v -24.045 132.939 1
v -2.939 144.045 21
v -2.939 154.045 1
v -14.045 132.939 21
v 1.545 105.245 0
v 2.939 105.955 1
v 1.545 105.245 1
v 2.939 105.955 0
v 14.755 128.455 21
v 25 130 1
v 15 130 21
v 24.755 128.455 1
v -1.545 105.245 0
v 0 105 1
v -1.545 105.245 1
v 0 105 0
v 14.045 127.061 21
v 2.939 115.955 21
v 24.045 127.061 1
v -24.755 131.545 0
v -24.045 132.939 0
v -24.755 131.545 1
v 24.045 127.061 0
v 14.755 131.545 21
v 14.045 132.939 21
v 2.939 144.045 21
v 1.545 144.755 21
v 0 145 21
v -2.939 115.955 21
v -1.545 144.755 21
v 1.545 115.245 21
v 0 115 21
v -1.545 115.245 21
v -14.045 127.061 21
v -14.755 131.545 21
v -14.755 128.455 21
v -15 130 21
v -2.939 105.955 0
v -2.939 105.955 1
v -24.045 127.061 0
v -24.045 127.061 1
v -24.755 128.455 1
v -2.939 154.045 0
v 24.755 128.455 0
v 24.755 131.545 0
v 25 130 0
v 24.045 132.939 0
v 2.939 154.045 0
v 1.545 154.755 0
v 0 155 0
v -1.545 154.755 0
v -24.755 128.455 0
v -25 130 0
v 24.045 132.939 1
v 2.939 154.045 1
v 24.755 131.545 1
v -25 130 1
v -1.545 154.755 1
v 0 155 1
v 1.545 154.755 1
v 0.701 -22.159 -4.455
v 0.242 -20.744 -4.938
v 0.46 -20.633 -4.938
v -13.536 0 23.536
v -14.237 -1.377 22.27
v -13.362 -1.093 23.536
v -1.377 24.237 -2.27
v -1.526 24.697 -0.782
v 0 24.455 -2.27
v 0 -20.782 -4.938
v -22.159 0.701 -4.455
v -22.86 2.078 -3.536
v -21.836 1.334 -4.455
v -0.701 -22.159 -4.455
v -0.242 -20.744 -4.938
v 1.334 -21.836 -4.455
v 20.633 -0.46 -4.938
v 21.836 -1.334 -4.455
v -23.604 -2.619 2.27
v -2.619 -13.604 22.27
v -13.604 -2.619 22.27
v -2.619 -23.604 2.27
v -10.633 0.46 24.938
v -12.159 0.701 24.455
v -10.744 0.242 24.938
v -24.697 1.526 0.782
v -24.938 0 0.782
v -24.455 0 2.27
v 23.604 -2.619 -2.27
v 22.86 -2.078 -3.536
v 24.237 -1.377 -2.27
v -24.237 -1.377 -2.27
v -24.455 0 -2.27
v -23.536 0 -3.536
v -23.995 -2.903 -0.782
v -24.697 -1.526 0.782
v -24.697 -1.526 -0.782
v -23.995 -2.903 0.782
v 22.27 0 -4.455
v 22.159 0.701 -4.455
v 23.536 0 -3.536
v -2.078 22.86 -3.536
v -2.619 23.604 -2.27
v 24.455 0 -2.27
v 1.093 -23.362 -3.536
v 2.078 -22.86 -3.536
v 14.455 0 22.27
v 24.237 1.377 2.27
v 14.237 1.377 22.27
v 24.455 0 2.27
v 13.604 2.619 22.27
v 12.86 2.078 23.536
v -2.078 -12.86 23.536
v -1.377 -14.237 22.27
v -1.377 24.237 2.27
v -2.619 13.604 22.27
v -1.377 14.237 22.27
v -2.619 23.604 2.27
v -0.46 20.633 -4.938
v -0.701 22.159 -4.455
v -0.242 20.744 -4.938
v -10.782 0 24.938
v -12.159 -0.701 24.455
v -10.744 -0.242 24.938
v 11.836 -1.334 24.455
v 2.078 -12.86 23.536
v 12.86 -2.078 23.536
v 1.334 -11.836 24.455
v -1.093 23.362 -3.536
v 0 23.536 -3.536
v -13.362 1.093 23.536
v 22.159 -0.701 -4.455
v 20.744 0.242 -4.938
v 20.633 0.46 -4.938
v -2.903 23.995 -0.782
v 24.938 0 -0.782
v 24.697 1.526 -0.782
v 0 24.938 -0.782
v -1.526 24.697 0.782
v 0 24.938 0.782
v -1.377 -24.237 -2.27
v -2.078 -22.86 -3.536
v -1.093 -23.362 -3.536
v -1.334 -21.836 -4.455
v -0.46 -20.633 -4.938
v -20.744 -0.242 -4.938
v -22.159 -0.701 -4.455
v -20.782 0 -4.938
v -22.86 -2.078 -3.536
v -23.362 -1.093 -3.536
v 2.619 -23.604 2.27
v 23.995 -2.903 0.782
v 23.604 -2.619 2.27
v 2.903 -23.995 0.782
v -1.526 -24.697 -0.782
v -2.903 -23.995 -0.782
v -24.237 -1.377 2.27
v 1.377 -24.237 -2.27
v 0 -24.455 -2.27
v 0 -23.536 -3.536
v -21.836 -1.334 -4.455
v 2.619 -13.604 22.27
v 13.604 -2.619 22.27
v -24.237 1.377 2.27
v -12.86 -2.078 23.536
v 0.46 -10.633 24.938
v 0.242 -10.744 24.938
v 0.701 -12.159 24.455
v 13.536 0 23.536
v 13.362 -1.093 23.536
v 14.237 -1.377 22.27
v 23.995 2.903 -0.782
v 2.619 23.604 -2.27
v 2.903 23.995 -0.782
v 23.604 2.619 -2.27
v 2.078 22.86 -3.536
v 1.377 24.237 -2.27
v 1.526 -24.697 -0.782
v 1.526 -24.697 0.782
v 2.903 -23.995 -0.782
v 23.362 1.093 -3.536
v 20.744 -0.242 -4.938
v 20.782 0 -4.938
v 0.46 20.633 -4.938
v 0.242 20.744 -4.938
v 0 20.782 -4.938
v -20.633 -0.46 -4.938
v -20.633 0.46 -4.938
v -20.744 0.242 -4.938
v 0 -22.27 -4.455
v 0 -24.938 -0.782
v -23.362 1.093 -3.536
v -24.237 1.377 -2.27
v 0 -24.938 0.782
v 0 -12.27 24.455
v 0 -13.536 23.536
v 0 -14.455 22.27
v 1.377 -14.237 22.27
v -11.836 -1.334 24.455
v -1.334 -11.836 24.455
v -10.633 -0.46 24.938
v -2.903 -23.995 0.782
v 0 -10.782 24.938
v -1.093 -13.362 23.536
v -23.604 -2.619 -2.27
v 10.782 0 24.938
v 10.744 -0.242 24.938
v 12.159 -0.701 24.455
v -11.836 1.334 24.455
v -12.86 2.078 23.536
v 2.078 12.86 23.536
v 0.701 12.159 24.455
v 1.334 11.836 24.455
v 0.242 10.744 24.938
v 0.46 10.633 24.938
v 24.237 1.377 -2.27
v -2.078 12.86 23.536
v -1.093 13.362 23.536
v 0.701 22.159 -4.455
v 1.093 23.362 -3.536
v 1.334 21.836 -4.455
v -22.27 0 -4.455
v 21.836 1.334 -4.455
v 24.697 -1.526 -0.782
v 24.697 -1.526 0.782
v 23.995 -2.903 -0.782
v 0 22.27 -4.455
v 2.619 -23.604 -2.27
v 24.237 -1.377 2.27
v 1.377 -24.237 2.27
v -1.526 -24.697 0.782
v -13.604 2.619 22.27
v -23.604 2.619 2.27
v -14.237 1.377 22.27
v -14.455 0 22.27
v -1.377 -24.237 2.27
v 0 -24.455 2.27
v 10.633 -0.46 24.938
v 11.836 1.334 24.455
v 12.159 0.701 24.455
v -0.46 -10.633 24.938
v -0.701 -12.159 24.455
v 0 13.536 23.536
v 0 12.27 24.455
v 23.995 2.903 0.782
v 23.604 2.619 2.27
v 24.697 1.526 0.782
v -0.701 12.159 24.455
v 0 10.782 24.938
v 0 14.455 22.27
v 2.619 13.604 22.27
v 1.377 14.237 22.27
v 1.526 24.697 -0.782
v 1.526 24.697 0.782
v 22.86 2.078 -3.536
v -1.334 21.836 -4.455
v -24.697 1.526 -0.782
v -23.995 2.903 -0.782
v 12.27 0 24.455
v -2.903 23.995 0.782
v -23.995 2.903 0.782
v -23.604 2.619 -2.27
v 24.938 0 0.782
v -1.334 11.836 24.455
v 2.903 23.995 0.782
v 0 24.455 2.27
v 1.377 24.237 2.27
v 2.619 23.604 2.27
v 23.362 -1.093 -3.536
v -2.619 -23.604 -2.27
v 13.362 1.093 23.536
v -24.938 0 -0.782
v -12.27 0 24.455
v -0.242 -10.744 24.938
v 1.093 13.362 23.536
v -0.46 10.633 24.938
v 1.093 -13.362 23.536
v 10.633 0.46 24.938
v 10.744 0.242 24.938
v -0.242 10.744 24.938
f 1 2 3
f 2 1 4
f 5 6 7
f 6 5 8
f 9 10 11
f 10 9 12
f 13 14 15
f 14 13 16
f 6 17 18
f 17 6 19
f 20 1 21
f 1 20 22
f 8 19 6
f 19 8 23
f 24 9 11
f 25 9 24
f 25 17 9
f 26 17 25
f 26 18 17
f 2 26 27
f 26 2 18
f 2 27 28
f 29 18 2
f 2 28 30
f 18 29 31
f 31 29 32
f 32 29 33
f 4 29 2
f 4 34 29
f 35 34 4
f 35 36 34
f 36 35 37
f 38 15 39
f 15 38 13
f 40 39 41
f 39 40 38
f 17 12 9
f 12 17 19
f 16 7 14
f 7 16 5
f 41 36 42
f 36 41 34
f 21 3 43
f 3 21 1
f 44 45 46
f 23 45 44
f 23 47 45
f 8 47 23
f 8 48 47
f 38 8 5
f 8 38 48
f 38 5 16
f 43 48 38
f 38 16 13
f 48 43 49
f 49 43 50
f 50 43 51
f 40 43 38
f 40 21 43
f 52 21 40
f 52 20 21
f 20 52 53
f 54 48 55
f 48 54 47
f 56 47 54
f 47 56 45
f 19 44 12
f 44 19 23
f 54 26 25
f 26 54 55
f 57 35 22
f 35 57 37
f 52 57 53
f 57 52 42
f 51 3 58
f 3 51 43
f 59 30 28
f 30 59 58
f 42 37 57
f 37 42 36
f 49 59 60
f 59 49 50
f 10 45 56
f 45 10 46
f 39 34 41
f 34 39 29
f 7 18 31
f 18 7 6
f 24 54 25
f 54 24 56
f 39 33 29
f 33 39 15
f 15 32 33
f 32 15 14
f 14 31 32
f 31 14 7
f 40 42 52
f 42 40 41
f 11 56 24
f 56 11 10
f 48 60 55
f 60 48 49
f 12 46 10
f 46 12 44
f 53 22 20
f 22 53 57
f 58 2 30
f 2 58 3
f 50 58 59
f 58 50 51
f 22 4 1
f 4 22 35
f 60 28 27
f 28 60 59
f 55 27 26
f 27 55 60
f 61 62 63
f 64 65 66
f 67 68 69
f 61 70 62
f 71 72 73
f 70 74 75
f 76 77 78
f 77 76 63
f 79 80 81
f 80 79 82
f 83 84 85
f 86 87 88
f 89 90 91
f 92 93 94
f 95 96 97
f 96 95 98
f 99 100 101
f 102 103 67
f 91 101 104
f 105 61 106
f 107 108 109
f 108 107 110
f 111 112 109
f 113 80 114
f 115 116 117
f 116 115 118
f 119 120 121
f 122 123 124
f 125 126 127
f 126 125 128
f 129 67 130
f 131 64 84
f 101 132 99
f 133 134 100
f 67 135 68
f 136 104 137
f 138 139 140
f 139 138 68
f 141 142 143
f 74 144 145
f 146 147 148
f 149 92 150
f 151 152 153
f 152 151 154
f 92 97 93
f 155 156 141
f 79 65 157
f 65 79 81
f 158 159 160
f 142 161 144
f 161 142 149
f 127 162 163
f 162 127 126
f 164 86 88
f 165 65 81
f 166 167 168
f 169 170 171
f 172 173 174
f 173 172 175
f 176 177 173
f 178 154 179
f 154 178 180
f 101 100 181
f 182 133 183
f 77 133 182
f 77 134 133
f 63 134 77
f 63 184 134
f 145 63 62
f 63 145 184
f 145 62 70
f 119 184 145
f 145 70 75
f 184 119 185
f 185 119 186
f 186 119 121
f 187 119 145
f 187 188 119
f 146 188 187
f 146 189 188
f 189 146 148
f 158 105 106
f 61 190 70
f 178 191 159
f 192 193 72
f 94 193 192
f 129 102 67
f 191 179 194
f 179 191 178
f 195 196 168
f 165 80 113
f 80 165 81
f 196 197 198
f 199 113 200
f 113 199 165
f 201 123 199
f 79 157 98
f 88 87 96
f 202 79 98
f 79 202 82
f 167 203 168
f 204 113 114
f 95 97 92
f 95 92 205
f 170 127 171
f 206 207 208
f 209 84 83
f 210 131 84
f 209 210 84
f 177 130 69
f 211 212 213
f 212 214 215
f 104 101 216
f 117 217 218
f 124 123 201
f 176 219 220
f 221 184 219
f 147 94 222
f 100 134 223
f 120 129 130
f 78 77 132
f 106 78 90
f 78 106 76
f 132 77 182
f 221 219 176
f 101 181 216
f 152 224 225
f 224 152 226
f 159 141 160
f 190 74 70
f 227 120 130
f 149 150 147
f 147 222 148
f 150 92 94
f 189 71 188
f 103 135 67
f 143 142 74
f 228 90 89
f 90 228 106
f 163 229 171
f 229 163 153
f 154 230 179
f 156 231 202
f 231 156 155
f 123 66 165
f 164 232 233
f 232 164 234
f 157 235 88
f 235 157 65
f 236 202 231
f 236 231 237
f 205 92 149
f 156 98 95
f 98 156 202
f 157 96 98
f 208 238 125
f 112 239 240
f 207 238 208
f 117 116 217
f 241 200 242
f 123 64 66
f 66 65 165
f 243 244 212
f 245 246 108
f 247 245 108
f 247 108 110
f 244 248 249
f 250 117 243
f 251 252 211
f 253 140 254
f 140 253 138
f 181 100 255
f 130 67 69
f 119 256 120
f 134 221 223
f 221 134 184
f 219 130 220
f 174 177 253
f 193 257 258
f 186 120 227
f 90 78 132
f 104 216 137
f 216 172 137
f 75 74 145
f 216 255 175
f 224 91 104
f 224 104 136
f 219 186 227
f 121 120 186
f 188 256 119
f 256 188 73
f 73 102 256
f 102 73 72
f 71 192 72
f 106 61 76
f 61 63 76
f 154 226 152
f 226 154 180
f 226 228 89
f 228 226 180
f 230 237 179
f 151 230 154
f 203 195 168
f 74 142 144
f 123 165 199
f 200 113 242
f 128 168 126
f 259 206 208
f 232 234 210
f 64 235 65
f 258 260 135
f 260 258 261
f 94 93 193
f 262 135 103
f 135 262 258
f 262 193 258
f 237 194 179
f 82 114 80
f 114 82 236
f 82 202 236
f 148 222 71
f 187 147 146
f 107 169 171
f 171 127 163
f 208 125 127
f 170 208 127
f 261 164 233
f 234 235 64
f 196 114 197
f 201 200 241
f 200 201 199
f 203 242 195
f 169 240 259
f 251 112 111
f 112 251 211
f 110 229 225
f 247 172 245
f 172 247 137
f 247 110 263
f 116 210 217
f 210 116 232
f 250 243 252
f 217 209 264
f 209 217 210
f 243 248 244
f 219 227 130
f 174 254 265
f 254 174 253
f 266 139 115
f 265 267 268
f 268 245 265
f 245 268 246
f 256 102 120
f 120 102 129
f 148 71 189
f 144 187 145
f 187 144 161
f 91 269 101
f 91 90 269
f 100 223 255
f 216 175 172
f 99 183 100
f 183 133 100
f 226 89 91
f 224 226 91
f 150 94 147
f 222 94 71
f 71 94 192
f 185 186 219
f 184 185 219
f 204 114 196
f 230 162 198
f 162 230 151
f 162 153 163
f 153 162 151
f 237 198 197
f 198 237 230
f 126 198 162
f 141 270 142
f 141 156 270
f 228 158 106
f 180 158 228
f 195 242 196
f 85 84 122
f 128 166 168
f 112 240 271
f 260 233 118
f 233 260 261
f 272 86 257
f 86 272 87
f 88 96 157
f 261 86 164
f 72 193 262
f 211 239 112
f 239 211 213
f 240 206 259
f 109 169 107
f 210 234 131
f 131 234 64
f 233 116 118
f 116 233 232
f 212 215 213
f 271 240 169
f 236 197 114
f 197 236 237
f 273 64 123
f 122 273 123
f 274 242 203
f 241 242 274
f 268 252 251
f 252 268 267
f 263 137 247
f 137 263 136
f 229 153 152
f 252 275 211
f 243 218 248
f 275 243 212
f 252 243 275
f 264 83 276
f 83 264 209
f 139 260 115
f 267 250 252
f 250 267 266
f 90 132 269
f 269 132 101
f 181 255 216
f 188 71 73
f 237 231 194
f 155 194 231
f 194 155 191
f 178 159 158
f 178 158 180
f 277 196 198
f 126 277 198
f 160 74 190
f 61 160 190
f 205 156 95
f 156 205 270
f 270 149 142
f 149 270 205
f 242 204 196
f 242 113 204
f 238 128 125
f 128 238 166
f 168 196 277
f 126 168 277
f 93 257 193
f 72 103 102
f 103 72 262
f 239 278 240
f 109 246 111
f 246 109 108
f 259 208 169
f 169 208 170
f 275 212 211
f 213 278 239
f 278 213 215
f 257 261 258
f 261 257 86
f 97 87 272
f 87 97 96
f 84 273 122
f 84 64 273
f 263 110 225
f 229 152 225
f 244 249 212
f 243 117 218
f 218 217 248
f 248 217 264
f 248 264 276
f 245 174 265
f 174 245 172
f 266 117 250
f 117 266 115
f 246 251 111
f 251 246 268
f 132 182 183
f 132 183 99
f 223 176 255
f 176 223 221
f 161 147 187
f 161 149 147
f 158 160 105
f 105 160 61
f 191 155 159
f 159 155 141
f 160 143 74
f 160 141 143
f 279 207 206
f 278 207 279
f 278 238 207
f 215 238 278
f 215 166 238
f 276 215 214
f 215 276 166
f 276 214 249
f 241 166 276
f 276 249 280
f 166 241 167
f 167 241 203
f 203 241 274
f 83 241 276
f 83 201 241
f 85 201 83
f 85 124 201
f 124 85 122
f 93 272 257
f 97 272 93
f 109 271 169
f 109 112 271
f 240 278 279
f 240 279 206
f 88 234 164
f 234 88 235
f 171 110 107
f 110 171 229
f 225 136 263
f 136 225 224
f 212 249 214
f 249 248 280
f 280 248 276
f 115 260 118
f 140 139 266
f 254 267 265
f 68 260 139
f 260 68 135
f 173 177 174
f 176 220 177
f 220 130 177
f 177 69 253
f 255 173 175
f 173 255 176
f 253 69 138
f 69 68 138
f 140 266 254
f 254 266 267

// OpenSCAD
// this one is shaped like a desktop keyboard keycap.
color("grey")
translate([0, 130, 0])
roundedPyramid(5, sides=20, sidesOnly=true);

// this one has rounded a top/bottom as well as rounded sides.
color("orange")
roundedPyramid(5, sides=20);

/**
 * 
 */
module roundedPyramid(cornerRadius, sides=30, sidesOnly=false)
//module roundedPyramid(size, cornerRadius, sides=30, sidesOnly=false)
{
	$fn=sides;
	
	minkowski()//size, cornerRadius)
	{
		cylinder(20,20,10,$fn=4);
	    
	    if(sidesOnly)
	    {
	    	cylinder(r=cornerRadius);
	    }
	    else
	    {
	    	sphere(r=cornerRadius);
	    	
    	}
	}	
}
